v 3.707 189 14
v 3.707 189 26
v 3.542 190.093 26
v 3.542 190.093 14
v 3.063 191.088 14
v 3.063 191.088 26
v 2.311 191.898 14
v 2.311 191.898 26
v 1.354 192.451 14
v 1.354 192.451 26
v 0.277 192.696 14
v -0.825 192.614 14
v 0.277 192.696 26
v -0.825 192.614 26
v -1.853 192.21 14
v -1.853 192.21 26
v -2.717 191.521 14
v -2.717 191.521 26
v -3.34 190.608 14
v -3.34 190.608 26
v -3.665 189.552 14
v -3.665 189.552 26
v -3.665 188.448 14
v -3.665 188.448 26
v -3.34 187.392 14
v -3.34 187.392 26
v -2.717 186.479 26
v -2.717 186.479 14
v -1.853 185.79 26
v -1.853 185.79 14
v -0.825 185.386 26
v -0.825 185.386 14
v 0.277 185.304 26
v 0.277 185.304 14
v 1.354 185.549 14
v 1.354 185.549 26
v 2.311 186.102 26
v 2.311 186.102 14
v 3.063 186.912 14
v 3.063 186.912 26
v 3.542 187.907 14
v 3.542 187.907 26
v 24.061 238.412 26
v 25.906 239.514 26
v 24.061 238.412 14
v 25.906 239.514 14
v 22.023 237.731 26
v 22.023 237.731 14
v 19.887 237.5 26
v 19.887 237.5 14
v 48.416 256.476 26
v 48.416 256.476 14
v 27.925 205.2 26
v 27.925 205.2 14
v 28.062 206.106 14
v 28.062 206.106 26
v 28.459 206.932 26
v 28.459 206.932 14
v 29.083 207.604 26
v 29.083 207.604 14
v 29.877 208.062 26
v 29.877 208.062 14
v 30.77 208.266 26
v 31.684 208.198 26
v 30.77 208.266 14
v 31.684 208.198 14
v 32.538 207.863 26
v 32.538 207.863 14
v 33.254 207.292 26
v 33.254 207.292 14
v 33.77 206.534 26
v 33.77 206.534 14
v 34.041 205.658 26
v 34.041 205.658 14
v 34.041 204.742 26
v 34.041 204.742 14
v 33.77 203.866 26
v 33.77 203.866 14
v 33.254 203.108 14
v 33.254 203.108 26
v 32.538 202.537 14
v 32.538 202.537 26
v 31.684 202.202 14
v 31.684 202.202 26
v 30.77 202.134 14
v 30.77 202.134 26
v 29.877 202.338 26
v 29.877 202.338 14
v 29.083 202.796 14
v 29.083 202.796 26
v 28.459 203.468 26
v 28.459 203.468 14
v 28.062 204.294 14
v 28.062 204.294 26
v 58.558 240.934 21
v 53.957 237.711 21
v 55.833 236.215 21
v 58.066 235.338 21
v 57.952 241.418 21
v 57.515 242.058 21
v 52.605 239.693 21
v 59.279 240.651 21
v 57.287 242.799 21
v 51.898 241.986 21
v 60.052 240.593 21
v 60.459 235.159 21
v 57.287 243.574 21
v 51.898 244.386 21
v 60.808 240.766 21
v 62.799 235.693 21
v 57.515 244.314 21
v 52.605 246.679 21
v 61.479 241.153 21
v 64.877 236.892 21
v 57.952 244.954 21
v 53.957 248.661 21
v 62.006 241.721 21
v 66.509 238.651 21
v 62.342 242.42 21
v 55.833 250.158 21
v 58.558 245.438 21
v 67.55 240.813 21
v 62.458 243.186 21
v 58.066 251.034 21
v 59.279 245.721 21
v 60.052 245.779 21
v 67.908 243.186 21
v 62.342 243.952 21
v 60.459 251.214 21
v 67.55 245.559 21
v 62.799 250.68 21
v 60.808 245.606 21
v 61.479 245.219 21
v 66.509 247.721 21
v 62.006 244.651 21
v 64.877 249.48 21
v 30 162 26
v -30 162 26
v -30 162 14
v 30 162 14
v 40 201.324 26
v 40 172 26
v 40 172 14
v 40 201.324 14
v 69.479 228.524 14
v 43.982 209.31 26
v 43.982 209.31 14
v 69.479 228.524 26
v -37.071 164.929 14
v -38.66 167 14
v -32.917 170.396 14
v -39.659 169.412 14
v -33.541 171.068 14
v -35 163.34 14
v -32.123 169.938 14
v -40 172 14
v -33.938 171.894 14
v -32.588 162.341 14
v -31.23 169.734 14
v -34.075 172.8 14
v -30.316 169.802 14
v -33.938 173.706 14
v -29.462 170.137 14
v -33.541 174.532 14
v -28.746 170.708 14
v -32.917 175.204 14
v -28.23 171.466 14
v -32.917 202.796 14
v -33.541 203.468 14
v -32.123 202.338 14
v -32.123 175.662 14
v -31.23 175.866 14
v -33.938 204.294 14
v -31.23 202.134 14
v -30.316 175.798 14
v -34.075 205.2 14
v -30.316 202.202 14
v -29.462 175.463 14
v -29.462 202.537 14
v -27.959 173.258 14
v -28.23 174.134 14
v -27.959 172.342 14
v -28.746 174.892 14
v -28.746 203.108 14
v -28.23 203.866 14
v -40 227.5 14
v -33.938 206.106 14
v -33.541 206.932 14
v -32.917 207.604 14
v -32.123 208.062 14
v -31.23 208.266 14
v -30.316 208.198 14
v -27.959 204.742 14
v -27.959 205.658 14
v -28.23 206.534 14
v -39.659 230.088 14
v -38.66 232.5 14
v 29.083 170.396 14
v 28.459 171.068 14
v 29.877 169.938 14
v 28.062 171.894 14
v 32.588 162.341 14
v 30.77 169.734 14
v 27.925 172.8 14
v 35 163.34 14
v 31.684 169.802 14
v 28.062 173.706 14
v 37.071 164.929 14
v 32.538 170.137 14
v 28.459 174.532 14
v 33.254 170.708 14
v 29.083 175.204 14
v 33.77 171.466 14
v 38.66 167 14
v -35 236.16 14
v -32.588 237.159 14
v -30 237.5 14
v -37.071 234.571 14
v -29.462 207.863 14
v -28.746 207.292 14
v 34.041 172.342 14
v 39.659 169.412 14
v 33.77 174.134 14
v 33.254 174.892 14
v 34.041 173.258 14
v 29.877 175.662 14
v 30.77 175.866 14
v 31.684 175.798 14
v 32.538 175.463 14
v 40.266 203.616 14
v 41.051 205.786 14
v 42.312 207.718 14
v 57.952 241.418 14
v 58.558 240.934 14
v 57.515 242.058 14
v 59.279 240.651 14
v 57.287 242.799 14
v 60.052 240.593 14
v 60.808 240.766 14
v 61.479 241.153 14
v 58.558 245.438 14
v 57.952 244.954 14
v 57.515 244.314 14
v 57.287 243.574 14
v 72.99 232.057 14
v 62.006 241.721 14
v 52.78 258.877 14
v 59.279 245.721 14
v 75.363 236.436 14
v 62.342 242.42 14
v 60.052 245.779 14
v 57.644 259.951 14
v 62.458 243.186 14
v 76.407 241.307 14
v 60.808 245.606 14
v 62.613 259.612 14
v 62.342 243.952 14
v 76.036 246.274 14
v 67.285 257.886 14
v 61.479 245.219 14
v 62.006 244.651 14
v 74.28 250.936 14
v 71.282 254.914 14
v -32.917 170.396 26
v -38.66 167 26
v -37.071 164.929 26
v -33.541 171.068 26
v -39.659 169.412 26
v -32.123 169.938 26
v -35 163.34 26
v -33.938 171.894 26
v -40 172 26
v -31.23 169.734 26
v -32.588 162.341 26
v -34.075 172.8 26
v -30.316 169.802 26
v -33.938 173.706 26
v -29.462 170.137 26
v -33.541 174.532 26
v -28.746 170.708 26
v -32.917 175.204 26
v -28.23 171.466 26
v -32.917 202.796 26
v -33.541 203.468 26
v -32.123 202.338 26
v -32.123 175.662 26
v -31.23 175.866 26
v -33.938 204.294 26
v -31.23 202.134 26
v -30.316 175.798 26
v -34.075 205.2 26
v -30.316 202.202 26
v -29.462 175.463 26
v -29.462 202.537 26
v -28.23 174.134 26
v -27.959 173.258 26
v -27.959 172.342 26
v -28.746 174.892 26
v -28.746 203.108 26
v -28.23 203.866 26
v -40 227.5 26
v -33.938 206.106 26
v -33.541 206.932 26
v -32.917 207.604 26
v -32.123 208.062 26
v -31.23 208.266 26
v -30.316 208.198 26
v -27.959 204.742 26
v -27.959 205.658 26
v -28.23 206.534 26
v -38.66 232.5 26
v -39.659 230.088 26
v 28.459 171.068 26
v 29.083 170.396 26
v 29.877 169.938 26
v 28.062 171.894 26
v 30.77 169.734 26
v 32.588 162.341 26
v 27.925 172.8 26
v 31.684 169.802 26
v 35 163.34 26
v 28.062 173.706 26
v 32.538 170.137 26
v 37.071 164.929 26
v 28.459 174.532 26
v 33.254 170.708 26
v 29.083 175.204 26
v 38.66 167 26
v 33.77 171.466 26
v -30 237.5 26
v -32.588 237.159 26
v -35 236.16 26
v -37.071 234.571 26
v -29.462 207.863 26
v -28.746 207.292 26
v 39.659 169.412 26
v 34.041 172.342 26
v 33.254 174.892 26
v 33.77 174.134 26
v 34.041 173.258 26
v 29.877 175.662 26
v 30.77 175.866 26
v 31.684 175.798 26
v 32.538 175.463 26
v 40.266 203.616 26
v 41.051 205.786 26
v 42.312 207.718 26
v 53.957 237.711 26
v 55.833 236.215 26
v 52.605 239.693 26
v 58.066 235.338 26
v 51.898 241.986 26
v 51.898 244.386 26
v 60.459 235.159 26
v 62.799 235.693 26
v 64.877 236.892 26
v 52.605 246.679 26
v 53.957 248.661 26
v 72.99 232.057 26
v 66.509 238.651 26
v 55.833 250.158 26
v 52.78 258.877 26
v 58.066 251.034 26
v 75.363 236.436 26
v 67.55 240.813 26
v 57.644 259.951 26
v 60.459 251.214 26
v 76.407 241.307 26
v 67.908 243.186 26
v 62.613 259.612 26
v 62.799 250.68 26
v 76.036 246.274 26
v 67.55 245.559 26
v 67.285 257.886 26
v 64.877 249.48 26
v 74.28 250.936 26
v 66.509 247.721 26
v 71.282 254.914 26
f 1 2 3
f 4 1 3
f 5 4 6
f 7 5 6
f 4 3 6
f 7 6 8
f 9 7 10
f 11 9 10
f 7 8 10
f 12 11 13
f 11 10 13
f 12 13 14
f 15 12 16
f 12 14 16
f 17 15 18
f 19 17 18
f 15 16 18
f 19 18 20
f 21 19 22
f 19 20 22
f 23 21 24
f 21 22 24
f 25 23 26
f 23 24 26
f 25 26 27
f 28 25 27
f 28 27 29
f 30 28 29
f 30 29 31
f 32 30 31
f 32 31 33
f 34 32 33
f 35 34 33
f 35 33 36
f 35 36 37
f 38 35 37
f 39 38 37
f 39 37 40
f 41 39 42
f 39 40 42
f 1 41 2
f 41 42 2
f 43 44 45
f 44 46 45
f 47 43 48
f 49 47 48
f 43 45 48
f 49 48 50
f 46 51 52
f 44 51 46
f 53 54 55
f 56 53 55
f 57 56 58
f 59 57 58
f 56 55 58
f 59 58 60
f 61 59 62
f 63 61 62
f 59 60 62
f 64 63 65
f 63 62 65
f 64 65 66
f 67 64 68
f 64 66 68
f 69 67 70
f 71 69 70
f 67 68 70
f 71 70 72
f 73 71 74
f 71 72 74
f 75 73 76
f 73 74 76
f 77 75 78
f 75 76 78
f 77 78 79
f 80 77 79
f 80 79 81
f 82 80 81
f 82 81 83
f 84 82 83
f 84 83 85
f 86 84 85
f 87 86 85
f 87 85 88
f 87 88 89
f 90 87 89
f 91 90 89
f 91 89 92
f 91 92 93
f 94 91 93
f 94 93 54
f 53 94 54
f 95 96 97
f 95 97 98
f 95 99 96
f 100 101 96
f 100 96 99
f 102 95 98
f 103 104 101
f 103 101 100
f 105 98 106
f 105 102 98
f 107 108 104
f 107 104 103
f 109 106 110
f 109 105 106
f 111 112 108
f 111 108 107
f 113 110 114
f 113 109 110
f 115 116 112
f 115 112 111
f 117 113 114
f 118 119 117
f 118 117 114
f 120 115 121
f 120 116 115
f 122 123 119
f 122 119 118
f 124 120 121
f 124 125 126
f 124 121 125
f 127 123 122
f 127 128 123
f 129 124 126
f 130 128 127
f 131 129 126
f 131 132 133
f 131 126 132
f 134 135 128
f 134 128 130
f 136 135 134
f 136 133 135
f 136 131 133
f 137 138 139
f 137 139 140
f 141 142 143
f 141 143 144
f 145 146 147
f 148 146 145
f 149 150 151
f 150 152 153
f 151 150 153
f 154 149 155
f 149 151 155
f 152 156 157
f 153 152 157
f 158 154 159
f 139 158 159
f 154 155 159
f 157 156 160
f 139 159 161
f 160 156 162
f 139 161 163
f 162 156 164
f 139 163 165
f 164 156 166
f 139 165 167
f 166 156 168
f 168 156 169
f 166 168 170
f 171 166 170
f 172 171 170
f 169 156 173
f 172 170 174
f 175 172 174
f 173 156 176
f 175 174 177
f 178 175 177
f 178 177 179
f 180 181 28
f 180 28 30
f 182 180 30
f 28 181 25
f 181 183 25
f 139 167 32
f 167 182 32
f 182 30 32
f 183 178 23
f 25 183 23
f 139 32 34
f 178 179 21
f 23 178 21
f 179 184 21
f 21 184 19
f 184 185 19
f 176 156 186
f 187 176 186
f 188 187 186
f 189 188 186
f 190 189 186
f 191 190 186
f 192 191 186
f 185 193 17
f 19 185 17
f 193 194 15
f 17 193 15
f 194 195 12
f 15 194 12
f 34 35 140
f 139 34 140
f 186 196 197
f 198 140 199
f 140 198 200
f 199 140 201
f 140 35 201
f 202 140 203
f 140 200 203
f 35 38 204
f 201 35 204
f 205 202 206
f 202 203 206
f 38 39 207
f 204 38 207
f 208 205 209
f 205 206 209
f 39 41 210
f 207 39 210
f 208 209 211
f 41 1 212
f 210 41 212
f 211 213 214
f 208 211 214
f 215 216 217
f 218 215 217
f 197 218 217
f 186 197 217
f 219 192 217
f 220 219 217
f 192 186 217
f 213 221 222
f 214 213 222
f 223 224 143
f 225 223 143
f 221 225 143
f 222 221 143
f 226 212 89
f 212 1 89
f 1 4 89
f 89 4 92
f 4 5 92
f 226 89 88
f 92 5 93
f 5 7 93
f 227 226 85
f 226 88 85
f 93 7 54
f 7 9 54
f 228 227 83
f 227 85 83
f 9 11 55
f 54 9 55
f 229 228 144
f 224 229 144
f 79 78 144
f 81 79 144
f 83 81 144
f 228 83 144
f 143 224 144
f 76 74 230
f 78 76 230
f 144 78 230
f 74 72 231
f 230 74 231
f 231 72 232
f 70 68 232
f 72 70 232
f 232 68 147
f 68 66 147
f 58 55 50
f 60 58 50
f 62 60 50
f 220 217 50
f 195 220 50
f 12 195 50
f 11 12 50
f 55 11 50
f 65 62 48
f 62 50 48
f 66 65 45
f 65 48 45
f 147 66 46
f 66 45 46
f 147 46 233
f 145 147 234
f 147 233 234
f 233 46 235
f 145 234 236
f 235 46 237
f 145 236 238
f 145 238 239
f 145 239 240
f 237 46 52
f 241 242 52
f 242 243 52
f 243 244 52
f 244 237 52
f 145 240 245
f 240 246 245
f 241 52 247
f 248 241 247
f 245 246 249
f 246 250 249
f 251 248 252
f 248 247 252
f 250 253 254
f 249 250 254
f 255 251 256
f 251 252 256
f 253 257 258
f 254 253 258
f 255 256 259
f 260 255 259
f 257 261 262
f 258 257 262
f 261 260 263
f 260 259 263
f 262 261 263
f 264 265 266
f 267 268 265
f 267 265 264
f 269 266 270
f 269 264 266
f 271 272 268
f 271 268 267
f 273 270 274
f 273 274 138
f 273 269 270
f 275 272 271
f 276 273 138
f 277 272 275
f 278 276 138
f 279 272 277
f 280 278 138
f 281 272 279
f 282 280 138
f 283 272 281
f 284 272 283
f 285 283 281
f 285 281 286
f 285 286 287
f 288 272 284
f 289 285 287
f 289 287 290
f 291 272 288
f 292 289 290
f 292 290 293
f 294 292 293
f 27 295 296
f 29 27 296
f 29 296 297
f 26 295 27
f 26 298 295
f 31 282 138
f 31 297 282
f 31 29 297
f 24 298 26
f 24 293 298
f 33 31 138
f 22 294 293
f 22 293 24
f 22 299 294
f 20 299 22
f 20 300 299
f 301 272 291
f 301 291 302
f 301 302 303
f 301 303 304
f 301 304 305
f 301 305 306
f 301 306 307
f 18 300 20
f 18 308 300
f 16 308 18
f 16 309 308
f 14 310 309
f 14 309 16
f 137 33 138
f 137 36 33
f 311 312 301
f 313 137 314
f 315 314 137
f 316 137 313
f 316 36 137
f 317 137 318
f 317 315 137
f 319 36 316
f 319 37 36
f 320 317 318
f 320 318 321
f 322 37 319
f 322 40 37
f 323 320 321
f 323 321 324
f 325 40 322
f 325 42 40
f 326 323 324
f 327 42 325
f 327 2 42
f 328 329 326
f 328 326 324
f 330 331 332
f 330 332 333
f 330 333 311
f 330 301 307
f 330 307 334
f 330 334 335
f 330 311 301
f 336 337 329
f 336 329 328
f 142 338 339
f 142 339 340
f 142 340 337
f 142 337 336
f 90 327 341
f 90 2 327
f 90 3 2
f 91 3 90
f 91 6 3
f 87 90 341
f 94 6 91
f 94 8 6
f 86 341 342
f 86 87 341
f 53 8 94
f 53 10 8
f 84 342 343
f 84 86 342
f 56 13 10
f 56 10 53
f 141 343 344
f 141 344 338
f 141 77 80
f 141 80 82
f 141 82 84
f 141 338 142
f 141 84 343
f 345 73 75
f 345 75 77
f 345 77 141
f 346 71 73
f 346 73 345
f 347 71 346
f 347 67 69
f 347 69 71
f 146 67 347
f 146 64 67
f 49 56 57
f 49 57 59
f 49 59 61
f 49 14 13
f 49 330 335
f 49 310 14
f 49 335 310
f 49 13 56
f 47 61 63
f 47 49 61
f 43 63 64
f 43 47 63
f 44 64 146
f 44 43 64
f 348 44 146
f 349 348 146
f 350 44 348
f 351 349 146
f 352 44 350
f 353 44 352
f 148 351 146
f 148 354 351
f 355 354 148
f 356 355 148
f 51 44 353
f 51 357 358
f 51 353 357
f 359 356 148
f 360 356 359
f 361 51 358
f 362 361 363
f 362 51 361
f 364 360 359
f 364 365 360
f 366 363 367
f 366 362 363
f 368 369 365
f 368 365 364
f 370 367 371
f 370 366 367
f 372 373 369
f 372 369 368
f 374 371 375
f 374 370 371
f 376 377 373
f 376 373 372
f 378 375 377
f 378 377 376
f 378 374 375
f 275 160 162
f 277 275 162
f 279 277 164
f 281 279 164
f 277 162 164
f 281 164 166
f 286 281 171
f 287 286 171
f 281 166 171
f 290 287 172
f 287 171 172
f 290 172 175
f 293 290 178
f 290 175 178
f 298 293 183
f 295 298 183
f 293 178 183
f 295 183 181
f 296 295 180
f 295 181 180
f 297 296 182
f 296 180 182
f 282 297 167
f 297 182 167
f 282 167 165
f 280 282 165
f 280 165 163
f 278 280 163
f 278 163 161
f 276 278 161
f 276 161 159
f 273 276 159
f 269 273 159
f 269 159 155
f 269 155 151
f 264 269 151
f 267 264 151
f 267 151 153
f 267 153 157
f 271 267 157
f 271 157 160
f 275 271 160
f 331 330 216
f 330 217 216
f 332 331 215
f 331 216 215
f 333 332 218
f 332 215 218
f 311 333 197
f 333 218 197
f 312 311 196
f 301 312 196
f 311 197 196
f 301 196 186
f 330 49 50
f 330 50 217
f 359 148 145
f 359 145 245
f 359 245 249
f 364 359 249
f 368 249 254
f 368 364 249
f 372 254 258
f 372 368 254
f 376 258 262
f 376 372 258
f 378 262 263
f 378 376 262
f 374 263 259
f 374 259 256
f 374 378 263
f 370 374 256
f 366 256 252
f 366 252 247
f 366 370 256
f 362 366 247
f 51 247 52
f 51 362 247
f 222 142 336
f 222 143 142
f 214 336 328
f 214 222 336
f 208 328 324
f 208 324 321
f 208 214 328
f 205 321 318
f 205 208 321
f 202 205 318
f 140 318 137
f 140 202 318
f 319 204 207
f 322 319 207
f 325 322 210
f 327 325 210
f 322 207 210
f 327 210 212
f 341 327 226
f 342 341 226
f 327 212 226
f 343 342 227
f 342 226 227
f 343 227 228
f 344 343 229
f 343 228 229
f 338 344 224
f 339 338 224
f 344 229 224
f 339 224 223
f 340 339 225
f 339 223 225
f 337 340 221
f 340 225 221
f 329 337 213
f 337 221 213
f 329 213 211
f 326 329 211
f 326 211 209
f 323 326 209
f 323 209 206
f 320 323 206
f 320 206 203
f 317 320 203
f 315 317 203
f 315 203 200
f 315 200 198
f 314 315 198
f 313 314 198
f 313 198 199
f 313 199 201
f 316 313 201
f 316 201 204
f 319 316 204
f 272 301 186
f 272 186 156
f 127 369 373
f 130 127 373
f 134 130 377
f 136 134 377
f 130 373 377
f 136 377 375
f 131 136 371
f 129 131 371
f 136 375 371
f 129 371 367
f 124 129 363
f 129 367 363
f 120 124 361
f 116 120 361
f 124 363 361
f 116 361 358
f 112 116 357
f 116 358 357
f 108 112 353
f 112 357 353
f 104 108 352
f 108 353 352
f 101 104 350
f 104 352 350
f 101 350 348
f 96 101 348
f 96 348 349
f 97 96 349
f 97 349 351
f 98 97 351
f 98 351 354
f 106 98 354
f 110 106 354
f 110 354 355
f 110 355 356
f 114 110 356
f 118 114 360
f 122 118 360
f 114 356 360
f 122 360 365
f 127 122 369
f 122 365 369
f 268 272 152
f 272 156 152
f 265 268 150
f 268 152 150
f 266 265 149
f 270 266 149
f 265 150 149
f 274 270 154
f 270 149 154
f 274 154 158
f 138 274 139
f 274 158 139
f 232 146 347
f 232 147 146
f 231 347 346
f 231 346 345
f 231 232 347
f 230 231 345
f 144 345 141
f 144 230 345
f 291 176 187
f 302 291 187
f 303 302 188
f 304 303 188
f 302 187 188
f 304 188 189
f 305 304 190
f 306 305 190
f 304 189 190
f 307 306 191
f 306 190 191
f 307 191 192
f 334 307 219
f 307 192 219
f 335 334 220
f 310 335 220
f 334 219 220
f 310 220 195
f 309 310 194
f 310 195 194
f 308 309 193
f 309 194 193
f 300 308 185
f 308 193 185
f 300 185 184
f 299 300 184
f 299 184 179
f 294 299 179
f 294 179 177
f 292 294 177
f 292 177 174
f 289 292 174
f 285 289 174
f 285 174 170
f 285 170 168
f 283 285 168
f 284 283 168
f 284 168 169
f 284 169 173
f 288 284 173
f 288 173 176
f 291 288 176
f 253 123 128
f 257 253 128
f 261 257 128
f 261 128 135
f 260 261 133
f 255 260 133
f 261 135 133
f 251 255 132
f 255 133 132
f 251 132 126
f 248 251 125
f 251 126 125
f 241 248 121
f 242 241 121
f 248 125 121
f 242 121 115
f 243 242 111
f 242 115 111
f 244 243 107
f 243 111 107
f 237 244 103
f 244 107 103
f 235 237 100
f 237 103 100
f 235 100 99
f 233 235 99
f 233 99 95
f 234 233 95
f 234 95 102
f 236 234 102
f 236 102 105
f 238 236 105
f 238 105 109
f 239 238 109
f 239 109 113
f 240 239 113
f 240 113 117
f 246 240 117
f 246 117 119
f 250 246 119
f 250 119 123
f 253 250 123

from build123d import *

# Parameters (mm, degrees)
SKETCH1_R              = 3.706733852
BOSS_EXTRUDE1_DEPTH    = 12
F_12_CLEARANCE_HOLE1_D = 6.15
FILLET1_R              = 10
SKETCH6_R              = 8.05
SKETCH6_R_2            = 2.6
CUT_EXTRUDE1_DEPTH     = 5
SKETCH6_2_R            = 2.6
CUT_EXTRUDE2_DEPTH     = 272.271439088


with BuildPart() as part:
    # Sketch1 → Boss-Extrude1 (new body)
    with BuildSketch(Plane.XY.offset(26)):
        with BuildLine():
            Line((48.415563176, 256.476121426), (23.233399504, 237.5))
            Line((23.233399504, 237.5), (-40, 237.5))
            Line((-40, 237.5), (-40, 162))
            Line((-40, 162), (40, 162))
            Line((40, 162), (40, 206.309791675))
            Line((40, 206.309791675), (69.479088987, 228.523878574))
            ThreePointArc((69.479088987, 228.523878574), (72.923447507, 253.031762905), (48.415563176, 256.476121426))
        make_face()
        with Locations((0, 189)):
            Circle(SKETCH1_R, mode=Mode.SUBTRACT)
    extrude(amount=-BOSS_EXTRUDE1_DEPTH)

    # #12 Clearance Hole1 (through all)
    with Locations(Plane.XY.offset(26)):
        with Locations((31, 172.8), (-31, 205.2), (-31, 172.8), (31, 205.2)):
            Hole(F_12_CLEARANCE_HOLE1_D / 2)

    # Fillet1
    fillet1_edges = [part.edges().sort_by_distance(p)[0] for p in [
        (40, 206.309791675, 20),
        (40, 162, 20),
        (-40, 162, 20),
        (-40, 237.5, 20),
        (23.233399504, 237.5, 20),
    ]]
    fillet(fillet1_edges, radius=FILLET1_R)

    # Sketch6 → Cut-Extrude1 (cut)
    with BuildSketch(Plane.XY.offset(26)):
        with Locations((59.857743265, 243.186048556)):
            Circle(SKETCH6_R)
        with Locations((59.857743265, 243.186048556)):
            Circle(SKETCH6_R_2, mode=Mode.SUBTRACT)
    extrude(amount=-CUT_EXTRUDE1_DEPTH, mode=Mode.SUBTRACT)

    # Sketch6<2> → Cut-Extrude2 (cut, through all)
    with BuildSketch(Plane.XY.offset(26)):
        with Locations((59.857743265, 243.186048556)):
            Circle(SKETCH6_2_R)
    extrude(amount=-CUT_EXTRUDE2_DEPTH, mode=Mode.SUBTRACT)


solid = part.part
